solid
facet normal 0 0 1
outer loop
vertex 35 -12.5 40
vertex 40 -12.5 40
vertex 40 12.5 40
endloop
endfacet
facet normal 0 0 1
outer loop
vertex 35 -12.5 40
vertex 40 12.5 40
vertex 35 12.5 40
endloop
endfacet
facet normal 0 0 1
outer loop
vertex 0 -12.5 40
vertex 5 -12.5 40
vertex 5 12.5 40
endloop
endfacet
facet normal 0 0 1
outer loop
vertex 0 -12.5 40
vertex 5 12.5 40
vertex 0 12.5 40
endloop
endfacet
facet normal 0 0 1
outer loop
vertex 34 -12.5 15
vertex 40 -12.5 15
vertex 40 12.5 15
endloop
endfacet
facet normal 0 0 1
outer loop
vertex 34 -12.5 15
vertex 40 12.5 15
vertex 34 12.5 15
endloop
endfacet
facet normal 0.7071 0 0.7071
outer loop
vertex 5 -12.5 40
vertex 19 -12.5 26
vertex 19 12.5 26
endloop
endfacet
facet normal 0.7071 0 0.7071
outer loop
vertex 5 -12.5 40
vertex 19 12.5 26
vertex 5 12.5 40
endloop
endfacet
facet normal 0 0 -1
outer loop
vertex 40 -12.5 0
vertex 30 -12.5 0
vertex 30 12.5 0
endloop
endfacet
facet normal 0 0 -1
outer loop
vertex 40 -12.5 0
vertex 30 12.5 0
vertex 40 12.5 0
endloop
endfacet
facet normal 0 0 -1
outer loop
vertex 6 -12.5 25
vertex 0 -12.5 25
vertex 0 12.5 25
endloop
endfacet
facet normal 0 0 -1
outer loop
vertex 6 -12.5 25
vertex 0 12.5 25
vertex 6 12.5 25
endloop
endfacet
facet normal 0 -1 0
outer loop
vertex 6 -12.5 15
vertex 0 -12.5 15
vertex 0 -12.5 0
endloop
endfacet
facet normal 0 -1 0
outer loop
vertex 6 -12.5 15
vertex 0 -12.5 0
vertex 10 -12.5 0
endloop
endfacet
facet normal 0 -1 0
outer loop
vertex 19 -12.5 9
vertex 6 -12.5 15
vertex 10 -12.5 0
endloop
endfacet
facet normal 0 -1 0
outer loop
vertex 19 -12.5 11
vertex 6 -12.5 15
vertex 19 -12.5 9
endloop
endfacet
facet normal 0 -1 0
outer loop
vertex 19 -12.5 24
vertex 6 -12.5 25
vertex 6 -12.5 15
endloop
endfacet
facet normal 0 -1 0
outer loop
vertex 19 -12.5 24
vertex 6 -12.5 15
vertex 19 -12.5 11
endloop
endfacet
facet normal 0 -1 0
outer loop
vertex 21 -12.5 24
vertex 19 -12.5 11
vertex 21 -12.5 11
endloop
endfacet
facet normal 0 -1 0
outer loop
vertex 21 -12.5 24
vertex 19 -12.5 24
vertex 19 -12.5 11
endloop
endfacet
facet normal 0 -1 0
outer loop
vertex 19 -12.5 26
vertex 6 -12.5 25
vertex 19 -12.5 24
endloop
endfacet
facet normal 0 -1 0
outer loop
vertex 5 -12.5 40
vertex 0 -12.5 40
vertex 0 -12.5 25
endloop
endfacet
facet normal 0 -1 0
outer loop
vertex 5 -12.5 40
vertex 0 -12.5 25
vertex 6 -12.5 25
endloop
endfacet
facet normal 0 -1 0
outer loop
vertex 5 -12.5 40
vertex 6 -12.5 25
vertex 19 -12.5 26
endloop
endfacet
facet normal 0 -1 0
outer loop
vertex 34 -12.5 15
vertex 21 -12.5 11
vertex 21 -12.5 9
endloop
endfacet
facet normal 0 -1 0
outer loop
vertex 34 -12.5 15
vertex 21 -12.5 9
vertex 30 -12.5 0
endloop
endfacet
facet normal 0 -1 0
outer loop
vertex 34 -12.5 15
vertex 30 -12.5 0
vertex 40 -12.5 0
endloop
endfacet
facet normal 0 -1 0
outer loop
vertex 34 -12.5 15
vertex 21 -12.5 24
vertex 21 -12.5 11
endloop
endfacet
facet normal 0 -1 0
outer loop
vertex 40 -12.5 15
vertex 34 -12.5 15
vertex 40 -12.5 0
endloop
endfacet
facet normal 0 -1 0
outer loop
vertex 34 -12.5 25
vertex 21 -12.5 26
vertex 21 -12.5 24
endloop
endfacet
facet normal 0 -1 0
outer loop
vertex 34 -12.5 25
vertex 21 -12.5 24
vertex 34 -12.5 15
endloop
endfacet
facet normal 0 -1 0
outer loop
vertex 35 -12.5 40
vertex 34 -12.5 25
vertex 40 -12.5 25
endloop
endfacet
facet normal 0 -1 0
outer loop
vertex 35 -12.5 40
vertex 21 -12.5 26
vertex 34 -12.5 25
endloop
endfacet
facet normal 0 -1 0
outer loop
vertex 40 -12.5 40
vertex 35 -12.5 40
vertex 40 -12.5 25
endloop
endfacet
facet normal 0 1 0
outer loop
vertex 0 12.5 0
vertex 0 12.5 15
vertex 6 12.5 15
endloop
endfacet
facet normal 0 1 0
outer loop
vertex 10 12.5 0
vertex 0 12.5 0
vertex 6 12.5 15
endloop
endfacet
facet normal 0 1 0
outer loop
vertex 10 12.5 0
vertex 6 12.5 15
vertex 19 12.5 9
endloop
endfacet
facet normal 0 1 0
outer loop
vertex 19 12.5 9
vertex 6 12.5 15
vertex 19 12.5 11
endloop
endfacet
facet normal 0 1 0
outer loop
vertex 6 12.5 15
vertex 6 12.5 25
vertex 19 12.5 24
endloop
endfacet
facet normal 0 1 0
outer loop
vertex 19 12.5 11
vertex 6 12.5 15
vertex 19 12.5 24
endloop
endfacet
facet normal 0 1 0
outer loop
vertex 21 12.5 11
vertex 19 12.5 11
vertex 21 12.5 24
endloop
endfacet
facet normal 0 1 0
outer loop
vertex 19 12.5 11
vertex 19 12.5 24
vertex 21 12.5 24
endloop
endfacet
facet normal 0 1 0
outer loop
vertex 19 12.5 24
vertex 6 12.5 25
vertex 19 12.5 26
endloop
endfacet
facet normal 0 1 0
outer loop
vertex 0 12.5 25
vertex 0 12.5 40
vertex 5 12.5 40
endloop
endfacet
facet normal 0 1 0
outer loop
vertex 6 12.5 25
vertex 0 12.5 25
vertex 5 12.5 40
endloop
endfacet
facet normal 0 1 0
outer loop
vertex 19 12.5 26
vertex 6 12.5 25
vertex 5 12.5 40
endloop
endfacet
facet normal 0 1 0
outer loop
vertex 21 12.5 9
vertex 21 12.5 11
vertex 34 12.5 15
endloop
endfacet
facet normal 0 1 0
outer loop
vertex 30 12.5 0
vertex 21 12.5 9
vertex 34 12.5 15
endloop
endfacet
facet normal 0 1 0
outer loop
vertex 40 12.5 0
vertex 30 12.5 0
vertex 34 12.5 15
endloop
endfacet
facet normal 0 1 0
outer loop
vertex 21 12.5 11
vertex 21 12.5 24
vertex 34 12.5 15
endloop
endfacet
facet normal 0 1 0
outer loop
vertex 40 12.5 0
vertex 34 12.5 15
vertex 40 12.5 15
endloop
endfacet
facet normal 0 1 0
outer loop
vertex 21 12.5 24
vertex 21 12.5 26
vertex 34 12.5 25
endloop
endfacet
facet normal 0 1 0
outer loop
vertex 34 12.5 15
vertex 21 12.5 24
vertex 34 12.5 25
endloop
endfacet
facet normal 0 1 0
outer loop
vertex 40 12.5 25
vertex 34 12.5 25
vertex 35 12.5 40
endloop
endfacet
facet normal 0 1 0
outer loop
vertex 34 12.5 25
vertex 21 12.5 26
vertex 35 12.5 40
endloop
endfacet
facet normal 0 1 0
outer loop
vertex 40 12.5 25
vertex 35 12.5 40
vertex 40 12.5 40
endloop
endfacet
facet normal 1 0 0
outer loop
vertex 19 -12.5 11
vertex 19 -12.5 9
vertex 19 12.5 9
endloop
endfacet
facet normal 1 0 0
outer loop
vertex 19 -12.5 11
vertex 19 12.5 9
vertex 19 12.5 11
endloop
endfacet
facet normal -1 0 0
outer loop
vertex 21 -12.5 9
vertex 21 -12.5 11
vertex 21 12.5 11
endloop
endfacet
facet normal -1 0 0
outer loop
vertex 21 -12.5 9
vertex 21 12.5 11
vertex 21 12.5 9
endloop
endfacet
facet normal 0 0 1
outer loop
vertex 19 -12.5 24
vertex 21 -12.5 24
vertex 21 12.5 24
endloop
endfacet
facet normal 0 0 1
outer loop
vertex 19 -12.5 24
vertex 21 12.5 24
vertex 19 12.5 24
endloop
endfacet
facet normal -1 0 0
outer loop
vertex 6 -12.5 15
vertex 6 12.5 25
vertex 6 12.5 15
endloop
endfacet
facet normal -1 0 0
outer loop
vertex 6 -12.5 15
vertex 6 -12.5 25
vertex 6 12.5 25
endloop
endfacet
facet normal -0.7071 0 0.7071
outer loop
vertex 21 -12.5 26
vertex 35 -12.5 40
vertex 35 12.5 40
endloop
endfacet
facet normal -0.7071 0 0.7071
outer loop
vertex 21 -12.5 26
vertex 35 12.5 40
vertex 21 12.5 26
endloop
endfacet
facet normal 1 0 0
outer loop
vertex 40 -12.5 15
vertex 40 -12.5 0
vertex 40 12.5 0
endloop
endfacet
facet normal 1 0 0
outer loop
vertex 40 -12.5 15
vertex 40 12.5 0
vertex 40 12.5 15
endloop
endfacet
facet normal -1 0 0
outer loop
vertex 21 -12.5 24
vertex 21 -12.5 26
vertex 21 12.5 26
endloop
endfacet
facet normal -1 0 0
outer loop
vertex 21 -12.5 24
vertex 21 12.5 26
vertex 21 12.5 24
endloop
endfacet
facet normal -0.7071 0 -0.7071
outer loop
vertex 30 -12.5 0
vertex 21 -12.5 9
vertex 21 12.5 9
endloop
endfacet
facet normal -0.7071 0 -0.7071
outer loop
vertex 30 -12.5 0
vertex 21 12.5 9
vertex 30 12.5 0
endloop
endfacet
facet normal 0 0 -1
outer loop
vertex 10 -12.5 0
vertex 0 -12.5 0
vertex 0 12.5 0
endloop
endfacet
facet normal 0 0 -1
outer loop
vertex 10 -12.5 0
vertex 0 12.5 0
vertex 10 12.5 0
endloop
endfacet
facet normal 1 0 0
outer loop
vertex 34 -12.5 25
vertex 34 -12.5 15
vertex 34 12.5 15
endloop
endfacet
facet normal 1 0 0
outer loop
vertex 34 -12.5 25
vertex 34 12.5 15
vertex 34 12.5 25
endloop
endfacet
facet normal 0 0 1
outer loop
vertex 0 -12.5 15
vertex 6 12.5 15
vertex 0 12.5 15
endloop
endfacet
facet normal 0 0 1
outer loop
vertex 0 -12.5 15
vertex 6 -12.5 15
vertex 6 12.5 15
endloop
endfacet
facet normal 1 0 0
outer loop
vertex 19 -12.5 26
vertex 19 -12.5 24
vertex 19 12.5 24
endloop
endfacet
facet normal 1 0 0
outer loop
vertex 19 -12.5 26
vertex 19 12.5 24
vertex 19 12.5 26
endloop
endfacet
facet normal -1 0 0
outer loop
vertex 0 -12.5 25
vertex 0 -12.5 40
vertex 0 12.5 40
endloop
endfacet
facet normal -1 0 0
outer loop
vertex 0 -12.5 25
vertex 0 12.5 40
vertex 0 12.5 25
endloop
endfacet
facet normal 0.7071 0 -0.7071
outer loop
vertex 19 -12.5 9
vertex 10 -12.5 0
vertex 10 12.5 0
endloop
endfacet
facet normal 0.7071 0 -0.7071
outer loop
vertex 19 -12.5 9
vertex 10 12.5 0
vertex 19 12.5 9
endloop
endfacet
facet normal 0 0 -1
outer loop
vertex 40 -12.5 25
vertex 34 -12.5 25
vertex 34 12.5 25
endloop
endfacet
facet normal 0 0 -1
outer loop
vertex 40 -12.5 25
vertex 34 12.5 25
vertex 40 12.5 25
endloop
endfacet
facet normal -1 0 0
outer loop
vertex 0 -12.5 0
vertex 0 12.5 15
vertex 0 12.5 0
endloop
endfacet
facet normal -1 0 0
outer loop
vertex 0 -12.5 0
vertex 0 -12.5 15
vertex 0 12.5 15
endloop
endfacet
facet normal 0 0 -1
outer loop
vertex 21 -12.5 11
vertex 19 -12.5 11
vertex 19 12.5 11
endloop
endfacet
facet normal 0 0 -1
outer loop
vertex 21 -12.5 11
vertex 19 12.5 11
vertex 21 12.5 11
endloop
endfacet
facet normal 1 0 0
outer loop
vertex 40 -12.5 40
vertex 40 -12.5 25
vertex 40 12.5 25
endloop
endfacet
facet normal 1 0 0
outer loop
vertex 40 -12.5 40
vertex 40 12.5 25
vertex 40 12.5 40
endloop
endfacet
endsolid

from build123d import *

# Parameters (mm, degrees)
F1_DEPTH = 12.5


with BuildPart() as f1:
    # F0 (on Front) → F1 (new body, symmetric)
    with BuildSketch(Plane.XZ):
        Polygon((0, 15), (0, 0), (10, 0), (19, 9), (19, 11), (21, 11), (21, 9), (30, 0), (40, 0), (40, 15), (34, 15), (34, 25), (40, 25), (40, 40), (35, 40), (21, 26), (21, 24), (19, 24), (19, 26), (5, 40), (0, 40), (0, 25), (6, 25), (6, 15), align=None)
    extrude(amount=F1_DEPTH, both=True)


solid = f1.part
